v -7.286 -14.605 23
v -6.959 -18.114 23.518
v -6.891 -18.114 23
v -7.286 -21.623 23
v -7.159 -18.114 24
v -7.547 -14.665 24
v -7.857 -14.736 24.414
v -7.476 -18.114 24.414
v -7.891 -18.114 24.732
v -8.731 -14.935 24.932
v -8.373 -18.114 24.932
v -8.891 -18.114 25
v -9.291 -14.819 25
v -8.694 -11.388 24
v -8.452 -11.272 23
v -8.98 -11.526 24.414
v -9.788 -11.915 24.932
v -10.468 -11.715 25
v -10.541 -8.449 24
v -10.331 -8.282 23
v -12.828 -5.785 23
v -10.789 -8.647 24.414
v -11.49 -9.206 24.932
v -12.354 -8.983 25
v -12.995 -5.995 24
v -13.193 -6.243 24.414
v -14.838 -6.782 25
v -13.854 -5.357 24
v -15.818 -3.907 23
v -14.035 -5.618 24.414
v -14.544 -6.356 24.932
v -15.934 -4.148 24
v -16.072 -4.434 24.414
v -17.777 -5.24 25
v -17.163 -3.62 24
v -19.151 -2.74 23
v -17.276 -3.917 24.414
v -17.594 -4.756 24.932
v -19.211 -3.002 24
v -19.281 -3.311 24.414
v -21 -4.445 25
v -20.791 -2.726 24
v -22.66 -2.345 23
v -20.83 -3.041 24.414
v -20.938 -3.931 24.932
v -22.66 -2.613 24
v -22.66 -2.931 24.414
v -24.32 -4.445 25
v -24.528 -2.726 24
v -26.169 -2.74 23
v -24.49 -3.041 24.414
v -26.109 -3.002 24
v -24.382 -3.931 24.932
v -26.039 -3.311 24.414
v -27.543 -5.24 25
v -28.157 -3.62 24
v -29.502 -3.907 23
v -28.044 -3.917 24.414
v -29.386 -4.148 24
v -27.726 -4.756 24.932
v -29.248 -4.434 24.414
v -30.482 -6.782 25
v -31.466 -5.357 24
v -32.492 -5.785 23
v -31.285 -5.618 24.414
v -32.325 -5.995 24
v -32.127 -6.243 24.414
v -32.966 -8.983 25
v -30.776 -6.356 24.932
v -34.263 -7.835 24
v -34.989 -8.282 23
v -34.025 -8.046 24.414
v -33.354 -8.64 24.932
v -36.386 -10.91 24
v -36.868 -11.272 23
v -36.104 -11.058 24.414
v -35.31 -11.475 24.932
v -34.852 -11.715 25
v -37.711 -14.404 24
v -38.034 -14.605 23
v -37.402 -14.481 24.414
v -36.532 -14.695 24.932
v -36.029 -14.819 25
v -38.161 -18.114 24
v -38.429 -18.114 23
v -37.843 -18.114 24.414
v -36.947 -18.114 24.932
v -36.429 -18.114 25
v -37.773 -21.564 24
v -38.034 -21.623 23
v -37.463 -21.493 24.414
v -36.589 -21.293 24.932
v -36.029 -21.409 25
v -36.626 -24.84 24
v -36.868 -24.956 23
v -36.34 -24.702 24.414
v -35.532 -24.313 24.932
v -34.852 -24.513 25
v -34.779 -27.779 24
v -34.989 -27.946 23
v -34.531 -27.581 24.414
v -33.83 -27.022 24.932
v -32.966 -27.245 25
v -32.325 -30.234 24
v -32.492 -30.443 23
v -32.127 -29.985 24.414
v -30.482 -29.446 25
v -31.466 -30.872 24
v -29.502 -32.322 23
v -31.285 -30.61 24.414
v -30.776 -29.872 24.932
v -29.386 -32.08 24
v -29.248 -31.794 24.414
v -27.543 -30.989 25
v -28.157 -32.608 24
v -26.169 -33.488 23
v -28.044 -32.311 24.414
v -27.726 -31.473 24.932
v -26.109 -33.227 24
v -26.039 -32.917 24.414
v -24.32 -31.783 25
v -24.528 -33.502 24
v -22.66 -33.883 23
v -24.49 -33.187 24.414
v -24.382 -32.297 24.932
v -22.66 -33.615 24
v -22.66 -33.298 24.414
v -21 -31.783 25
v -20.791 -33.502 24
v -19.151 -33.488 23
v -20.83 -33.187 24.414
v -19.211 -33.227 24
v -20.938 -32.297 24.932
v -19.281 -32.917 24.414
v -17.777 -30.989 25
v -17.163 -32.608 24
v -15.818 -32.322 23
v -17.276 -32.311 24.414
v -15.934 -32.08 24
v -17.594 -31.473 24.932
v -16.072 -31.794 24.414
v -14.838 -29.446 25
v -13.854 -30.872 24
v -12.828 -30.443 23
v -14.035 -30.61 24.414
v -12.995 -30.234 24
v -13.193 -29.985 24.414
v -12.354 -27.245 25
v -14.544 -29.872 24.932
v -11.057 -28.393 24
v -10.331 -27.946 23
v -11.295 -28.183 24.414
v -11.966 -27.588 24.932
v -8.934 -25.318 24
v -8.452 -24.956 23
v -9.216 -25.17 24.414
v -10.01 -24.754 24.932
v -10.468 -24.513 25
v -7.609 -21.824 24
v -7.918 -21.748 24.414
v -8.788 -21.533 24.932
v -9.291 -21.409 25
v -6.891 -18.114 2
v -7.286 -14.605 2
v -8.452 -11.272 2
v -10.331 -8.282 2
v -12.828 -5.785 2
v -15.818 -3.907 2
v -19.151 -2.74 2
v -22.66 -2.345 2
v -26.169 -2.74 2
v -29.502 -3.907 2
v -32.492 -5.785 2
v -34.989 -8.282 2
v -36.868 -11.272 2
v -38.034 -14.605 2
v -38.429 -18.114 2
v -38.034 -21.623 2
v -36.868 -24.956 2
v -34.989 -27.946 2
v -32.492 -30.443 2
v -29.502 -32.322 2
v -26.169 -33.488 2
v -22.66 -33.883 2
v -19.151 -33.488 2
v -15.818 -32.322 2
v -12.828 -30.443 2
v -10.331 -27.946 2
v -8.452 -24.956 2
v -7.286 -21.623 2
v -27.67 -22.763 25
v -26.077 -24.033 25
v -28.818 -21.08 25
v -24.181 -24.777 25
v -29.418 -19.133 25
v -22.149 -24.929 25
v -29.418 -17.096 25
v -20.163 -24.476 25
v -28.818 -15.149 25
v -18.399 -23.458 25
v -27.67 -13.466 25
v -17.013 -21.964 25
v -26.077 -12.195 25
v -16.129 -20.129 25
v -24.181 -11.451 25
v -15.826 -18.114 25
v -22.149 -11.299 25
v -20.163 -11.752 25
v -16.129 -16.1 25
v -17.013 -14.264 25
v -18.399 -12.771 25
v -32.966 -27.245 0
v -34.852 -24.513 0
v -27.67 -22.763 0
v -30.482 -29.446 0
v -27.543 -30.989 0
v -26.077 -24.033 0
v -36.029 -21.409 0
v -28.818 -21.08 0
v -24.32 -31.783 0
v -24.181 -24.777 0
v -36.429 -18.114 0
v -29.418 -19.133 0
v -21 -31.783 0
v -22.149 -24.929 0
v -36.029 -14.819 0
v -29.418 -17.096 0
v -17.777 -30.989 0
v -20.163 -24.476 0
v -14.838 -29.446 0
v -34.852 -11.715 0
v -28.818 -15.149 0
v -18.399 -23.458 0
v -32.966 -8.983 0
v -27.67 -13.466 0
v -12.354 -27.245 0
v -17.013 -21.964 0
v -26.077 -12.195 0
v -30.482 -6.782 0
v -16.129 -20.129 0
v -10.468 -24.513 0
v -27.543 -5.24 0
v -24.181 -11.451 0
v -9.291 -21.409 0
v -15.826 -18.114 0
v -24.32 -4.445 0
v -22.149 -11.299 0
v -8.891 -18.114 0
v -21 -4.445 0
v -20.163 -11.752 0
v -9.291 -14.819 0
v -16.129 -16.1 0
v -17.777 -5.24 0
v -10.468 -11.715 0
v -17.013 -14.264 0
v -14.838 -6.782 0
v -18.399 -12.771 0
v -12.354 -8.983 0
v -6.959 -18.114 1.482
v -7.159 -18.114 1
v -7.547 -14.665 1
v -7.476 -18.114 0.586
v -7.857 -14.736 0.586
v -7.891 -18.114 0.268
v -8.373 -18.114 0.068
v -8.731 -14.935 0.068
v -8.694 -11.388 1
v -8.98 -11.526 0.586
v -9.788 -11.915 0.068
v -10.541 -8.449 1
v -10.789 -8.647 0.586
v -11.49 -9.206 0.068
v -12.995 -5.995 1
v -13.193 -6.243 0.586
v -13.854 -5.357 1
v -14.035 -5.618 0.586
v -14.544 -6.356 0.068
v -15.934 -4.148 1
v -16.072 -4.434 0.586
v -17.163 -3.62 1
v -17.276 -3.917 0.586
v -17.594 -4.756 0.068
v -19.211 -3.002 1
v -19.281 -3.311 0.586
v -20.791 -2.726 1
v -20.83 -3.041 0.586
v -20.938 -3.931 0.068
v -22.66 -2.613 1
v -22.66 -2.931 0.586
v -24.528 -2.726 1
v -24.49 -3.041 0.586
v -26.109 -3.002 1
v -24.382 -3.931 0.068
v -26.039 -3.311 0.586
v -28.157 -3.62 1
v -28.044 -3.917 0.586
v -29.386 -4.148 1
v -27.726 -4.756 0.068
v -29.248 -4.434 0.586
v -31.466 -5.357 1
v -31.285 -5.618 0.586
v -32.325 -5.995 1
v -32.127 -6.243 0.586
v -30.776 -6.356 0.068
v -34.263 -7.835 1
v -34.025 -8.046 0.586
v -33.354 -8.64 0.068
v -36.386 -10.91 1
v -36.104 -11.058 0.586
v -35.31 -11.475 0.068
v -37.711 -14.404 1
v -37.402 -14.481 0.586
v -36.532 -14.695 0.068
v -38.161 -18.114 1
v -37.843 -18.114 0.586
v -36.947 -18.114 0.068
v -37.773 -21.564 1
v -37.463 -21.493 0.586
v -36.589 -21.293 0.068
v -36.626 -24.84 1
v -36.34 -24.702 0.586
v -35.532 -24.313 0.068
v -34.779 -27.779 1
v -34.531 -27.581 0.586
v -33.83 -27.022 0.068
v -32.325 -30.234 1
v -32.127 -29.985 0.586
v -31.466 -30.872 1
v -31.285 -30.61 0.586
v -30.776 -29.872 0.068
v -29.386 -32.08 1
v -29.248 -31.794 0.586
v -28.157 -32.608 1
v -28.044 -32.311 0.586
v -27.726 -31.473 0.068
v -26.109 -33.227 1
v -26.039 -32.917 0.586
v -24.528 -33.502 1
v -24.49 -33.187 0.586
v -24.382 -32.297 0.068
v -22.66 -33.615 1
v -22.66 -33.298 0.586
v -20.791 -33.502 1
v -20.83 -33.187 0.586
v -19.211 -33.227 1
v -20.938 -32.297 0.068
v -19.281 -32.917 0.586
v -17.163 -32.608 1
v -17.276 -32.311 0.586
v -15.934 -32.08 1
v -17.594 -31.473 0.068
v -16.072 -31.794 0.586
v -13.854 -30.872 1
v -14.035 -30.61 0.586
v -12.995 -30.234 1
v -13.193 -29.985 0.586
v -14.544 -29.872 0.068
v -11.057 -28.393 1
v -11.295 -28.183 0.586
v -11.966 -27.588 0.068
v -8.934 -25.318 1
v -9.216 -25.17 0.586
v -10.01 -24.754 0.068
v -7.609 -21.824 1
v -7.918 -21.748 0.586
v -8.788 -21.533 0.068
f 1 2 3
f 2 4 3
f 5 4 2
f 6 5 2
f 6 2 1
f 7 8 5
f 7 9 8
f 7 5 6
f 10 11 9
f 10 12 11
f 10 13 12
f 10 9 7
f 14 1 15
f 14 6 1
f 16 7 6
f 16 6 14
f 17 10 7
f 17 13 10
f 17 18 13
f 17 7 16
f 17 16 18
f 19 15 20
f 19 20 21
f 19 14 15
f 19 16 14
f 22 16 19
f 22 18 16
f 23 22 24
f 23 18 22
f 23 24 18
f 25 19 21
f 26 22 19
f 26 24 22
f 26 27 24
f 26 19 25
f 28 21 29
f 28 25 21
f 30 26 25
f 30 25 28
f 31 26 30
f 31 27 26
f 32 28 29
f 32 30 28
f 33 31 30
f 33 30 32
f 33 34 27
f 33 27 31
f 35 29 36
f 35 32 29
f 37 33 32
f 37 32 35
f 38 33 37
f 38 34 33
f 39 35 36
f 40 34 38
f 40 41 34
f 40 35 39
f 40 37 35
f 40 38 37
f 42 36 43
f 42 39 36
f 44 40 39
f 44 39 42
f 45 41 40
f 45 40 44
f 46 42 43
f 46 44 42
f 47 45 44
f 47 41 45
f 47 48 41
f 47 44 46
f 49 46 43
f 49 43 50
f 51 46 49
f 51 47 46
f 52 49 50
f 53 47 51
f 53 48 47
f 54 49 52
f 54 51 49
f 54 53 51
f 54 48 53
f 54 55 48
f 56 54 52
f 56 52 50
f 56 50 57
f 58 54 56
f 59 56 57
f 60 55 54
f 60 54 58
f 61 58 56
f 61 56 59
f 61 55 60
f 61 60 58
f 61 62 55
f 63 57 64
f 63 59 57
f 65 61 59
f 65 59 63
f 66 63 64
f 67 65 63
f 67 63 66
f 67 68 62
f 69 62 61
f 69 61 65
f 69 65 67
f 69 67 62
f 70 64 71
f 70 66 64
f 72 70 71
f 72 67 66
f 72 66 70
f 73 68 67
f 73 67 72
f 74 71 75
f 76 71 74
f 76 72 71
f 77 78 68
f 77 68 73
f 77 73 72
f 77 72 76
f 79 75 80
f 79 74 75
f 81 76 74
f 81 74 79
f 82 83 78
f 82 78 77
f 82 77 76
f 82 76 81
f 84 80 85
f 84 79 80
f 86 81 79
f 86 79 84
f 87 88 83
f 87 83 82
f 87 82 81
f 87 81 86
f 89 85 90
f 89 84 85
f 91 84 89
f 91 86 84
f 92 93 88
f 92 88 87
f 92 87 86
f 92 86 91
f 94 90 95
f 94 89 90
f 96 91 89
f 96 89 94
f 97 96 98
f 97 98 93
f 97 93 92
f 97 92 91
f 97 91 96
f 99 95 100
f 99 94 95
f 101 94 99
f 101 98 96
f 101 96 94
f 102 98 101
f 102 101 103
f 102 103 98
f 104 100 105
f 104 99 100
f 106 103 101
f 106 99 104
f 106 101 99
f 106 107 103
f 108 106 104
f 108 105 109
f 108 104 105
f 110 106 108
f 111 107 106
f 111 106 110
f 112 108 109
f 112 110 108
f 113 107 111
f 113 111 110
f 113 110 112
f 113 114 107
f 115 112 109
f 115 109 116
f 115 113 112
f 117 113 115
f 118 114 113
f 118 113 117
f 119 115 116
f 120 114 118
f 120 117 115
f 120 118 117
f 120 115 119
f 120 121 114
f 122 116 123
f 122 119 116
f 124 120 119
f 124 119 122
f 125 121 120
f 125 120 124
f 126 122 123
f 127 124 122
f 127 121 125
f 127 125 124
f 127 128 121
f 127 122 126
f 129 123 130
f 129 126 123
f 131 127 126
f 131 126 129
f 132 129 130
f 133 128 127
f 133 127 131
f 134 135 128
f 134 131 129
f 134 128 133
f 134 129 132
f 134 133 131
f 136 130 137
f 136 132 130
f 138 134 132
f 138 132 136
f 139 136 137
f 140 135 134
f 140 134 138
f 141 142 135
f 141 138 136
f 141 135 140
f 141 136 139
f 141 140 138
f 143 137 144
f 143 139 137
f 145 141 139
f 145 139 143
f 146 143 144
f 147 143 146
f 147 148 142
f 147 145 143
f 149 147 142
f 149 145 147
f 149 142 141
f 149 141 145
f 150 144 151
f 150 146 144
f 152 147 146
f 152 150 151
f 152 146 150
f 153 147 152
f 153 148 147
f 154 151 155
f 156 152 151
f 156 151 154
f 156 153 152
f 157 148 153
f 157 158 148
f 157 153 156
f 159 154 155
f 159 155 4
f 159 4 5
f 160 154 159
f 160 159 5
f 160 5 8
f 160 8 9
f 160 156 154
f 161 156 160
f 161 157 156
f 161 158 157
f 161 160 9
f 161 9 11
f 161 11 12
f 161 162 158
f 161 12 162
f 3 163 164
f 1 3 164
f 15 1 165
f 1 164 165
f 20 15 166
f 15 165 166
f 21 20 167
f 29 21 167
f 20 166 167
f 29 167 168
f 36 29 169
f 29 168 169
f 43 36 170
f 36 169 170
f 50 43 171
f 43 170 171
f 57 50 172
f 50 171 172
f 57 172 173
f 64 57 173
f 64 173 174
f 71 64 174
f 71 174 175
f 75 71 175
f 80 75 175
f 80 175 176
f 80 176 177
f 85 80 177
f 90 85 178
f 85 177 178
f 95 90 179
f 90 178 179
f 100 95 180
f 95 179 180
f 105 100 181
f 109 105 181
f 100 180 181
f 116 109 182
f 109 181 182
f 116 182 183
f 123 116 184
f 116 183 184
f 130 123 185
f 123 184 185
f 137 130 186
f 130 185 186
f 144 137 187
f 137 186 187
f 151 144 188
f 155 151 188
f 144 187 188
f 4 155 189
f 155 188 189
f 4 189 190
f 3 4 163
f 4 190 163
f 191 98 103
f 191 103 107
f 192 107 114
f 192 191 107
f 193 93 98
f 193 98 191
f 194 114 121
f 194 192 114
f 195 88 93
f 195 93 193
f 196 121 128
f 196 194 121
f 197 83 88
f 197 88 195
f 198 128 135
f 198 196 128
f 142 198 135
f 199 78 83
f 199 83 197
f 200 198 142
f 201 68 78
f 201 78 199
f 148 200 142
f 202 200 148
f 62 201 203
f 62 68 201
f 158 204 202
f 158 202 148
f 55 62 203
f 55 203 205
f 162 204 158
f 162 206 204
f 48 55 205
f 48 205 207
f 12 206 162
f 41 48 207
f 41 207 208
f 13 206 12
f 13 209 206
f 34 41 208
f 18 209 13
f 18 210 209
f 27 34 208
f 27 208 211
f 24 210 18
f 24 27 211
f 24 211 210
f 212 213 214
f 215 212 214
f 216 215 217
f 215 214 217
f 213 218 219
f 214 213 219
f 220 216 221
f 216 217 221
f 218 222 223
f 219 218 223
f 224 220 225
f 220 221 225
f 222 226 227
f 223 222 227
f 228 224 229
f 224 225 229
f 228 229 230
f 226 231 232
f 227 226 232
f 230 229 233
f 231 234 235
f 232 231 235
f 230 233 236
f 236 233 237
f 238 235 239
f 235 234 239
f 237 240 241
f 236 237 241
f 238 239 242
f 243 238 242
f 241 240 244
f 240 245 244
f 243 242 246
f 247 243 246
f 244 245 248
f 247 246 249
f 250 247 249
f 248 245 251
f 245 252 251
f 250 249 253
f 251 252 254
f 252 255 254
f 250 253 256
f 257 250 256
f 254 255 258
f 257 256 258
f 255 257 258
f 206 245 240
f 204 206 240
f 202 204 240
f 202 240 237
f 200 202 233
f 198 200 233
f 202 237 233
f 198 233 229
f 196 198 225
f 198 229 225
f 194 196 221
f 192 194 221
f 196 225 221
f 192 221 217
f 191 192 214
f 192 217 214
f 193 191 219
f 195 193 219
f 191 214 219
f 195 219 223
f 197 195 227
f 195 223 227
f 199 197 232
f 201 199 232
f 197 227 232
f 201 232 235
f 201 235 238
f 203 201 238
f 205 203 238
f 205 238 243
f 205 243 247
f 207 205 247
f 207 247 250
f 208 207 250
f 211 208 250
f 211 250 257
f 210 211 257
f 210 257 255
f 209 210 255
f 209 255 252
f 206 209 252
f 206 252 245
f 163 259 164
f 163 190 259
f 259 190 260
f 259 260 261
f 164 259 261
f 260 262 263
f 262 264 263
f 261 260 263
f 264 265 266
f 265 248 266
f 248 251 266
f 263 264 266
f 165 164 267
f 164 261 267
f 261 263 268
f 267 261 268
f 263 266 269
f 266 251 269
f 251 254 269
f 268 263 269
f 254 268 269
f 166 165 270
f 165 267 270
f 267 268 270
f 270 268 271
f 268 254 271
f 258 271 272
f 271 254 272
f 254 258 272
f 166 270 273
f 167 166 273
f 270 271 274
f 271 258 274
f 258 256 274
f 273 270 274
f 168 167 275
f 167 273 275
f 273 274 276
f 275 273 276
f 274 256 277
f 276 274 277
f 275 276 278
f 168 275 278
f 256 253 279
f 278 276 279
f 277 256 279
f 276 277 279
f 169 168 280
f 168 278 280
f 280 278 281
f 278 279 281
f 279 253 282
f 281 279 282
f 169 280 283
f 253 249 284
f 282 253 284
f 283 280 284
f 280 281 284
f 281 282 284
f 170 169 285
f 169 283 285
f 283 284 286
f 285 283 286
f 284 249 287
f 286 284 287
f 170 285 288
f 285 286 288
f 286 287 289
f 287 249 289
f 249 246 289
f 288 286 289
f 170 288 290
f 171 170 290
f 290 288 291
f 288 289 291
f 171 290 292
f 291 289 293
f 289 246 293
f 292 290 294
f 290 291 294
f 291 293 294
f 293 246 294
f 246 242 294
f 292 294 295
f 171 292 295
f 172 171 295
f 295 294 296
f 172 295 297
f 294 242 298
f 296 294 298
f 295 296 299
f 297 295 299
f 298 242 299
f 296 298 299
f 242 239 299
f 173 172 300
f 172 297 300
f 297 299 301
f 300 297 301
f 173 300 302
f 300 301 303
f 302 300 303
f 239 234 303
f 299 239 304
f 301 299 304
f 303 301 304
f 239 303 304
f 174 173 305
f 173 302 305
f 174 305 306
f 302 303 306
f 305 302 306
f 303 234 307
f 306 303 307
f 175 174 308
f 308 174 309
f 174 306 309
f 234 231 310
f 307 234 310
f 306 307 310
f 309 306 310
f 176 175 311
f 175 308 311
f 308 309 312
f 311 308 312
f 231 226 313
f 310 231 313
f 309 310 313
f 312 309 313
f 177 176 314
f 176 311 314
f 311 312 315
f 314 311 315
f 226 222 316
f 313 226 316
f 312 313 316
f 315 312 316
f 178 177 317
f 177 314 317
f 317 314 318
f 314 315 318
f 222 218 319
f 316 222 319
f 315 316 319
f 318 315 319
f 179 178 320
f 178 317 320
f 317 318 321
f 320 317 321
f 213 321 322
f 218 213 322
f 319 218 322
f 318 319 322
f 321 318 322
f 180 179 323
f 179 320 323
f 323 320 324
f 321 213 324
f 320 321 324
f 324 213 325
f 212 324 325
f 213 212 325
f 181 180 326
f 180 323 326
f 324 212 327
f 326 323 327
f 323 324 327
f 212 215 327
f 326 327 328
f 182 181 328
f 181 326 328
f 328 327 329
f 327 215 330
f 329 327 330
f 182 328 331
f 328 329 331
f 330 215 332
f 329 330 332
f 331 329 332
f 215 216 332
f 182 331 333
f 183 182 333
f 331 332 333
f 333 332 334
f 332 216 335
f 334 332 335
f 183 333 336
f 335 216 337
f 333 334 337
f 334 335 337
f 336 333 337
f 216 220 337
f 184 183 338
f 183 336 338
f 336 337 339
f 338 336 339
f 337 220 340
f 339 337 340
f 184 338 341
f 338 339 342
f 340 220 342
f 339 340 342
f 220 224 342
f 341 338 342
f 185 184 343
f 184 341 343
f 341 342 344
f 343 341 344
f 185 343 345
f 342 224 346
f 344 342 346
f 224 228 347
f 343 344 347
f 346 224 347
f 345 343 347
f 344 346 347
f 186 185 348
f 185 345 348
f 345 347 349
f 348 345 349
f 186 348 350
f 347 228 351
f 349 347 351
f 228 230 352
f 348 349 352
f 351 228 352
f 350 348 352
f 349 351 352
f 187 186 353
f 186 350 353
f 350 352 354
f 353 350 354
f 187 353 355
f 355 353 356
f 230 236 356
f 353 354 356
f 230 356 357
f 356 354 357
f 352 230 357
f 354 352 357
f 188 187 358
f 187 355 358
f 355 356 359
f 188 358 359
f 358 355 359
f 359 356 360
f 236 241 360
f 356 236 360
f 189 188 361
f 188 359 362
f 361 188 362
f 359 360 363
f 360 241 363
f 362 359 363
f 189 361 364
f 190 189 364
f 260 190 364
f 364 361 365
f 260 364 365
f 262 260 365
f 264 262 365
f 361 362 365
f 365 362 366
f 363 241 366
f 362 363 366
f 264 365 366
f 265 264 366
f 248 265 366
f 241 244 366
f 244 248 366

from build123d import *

# Parameters (mm, degrees)
F0_R     = 15.7692613996
F1_DEPTH = 25
F2_R     = 2
F3_R     = 6.8344152612
F4_DEPTH = 40


# Not quite as in the source:
# - a feature names something its author has since deleted; it is built from what else it names


with BuildPart() as f1:
    # F0 (on Top) → F1 (new body)
    with BuildSketch(Plane.XY):
        with Locations((-22.6599406451, -18.1141793728)):
            Circle(F0_R)
    extrude(amount=F1_DEPTH)

    # F2
    f2_edges = [f1.edges().sort_by_distance(p)[0] for p in [
        (-38.429202, -18.114179, 0),
        (-38.429202, -18.114179, 25),
    ]]
    fillet(f2_edges, radius=F2_R)

    # F3 (on face) → F4 (cut)
    with BuildSketch(Plane(origin=(0, 0, 0), x_dir=(1, 0, 0), z_dir=(0, 0, -1))):
        with Locations((-22.6599406451, 18.1141793728)):
            Circle(F3_R)
    extrude(amount=-F4_DEPTH, mode=Mode.SUBTRACT)


solid = f1.part
